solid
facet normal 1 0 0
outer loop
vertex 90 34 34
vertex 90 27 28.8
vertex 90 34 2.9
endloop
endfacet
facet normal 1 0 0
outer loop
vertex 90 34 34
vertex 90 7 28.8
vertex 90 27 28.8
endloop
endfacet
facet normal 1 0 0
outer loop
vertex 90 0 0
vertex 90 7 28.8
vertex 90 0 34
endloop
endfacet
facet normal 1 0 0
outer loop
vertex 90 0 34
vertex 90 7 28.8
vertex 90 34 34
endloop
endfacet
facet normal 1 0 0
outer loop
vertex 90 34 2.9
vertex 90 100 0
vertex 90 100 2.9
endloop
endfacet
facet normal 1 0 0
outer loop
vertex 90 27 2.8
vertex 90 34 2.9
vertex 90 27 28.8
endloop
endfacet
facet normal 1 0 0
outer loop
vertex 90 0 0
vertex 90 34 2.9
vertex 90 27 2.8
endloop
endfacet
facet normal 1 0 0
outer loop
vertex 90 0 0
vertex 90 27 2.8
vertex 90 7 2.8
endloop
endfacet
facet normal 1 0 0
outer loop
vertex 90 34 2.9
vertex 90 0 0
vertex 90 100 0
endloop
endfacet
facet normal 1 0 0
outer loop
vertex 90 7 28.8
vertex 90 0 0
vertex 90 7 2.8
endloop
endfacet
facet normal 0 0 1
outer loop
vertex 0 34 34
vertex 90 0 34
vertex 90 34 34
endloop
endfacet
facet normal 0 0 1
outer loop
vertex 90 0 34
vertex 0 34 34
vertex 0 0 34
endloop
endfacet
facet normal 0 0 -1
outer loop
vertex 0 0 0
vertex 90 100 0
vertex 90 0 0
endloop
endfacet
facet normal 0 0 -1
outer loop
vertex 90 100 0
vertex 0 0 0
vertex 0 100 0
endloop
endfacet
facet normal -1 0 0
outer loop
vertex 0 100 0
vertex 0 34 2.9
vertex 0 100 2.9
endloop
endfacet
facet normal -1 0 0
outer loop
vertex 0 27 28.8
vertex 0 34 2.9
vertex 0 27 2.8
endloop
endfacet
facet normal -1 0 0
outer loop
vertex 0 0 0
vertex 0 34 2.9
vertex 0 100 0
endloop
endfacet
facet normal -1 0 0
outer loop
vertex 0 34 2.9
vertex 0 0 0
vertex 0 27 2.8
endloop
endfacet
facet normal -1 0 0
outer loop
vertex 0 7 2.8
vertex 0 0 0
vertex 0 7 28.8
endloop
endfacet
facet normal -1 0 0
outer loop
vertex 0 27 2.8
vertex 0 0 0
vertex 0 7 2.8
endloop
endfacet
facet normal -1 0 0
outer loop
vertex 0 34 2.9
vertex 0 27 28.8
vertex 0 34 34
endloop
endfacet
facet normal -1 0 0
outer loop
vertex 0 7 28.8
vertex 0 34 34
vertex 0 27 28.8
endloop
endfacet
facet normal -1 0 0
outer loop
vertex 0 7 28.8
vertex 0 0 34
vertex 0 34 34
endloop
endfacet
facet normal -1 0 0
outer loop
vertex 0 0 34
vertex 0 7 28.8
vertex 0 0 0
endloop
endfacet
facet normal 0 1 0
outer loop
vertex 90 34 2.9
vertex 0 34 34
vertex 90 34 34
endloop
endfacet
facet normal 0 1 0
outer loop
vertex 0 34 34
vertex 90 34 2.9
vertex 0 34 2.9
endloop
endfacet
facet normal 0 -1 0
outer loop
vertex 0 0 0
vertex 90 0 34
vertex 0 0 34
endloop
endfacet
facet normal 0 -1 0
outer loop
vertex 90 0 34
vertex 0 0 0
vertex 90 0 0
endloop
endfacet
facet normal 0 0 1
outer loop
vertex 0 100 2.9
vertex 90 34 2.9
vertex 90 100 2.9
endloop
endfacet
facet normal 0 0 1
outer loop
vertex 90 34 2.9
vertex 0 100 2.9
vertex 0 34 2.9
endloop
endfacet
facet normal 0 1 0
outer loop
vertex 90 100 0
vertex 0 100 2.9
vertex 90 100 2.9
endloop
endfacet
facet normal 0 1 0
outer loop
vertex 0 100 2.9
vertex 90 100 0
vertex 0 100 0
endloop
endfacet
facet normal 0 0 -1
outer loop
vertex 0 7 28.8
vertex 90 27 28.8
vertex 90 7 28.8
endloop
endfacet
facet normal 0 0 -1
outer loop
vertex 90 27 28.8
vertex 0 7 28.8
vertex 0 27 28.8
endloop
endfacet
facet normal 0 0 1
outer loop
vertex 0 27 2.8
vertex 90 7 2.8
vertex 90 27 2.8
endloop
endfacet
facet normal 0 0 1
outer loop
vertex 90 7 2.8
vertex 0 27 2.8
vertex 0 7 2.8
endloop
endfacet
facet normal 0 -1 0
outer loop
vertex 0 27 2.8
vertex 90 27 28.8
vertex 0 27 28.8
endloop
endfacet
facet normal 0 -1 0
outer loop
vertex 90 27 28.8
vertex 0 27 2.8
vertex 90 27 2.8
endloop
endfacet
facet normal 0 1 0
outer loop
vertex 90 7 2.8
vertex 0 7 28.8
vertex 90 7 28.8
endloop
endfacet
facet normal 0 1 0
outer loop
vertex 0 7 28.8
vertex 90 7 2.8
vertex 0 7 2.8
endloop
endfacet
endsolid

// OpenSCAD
difference() {
    translate([0, 0, 0]) {
        cube([90, 34, 34]);
        cube([90, 100, 2.9]);
    }
    translate([-5, 7, 2.8]) {
        cube([100, 20, 26]);
    }
}
